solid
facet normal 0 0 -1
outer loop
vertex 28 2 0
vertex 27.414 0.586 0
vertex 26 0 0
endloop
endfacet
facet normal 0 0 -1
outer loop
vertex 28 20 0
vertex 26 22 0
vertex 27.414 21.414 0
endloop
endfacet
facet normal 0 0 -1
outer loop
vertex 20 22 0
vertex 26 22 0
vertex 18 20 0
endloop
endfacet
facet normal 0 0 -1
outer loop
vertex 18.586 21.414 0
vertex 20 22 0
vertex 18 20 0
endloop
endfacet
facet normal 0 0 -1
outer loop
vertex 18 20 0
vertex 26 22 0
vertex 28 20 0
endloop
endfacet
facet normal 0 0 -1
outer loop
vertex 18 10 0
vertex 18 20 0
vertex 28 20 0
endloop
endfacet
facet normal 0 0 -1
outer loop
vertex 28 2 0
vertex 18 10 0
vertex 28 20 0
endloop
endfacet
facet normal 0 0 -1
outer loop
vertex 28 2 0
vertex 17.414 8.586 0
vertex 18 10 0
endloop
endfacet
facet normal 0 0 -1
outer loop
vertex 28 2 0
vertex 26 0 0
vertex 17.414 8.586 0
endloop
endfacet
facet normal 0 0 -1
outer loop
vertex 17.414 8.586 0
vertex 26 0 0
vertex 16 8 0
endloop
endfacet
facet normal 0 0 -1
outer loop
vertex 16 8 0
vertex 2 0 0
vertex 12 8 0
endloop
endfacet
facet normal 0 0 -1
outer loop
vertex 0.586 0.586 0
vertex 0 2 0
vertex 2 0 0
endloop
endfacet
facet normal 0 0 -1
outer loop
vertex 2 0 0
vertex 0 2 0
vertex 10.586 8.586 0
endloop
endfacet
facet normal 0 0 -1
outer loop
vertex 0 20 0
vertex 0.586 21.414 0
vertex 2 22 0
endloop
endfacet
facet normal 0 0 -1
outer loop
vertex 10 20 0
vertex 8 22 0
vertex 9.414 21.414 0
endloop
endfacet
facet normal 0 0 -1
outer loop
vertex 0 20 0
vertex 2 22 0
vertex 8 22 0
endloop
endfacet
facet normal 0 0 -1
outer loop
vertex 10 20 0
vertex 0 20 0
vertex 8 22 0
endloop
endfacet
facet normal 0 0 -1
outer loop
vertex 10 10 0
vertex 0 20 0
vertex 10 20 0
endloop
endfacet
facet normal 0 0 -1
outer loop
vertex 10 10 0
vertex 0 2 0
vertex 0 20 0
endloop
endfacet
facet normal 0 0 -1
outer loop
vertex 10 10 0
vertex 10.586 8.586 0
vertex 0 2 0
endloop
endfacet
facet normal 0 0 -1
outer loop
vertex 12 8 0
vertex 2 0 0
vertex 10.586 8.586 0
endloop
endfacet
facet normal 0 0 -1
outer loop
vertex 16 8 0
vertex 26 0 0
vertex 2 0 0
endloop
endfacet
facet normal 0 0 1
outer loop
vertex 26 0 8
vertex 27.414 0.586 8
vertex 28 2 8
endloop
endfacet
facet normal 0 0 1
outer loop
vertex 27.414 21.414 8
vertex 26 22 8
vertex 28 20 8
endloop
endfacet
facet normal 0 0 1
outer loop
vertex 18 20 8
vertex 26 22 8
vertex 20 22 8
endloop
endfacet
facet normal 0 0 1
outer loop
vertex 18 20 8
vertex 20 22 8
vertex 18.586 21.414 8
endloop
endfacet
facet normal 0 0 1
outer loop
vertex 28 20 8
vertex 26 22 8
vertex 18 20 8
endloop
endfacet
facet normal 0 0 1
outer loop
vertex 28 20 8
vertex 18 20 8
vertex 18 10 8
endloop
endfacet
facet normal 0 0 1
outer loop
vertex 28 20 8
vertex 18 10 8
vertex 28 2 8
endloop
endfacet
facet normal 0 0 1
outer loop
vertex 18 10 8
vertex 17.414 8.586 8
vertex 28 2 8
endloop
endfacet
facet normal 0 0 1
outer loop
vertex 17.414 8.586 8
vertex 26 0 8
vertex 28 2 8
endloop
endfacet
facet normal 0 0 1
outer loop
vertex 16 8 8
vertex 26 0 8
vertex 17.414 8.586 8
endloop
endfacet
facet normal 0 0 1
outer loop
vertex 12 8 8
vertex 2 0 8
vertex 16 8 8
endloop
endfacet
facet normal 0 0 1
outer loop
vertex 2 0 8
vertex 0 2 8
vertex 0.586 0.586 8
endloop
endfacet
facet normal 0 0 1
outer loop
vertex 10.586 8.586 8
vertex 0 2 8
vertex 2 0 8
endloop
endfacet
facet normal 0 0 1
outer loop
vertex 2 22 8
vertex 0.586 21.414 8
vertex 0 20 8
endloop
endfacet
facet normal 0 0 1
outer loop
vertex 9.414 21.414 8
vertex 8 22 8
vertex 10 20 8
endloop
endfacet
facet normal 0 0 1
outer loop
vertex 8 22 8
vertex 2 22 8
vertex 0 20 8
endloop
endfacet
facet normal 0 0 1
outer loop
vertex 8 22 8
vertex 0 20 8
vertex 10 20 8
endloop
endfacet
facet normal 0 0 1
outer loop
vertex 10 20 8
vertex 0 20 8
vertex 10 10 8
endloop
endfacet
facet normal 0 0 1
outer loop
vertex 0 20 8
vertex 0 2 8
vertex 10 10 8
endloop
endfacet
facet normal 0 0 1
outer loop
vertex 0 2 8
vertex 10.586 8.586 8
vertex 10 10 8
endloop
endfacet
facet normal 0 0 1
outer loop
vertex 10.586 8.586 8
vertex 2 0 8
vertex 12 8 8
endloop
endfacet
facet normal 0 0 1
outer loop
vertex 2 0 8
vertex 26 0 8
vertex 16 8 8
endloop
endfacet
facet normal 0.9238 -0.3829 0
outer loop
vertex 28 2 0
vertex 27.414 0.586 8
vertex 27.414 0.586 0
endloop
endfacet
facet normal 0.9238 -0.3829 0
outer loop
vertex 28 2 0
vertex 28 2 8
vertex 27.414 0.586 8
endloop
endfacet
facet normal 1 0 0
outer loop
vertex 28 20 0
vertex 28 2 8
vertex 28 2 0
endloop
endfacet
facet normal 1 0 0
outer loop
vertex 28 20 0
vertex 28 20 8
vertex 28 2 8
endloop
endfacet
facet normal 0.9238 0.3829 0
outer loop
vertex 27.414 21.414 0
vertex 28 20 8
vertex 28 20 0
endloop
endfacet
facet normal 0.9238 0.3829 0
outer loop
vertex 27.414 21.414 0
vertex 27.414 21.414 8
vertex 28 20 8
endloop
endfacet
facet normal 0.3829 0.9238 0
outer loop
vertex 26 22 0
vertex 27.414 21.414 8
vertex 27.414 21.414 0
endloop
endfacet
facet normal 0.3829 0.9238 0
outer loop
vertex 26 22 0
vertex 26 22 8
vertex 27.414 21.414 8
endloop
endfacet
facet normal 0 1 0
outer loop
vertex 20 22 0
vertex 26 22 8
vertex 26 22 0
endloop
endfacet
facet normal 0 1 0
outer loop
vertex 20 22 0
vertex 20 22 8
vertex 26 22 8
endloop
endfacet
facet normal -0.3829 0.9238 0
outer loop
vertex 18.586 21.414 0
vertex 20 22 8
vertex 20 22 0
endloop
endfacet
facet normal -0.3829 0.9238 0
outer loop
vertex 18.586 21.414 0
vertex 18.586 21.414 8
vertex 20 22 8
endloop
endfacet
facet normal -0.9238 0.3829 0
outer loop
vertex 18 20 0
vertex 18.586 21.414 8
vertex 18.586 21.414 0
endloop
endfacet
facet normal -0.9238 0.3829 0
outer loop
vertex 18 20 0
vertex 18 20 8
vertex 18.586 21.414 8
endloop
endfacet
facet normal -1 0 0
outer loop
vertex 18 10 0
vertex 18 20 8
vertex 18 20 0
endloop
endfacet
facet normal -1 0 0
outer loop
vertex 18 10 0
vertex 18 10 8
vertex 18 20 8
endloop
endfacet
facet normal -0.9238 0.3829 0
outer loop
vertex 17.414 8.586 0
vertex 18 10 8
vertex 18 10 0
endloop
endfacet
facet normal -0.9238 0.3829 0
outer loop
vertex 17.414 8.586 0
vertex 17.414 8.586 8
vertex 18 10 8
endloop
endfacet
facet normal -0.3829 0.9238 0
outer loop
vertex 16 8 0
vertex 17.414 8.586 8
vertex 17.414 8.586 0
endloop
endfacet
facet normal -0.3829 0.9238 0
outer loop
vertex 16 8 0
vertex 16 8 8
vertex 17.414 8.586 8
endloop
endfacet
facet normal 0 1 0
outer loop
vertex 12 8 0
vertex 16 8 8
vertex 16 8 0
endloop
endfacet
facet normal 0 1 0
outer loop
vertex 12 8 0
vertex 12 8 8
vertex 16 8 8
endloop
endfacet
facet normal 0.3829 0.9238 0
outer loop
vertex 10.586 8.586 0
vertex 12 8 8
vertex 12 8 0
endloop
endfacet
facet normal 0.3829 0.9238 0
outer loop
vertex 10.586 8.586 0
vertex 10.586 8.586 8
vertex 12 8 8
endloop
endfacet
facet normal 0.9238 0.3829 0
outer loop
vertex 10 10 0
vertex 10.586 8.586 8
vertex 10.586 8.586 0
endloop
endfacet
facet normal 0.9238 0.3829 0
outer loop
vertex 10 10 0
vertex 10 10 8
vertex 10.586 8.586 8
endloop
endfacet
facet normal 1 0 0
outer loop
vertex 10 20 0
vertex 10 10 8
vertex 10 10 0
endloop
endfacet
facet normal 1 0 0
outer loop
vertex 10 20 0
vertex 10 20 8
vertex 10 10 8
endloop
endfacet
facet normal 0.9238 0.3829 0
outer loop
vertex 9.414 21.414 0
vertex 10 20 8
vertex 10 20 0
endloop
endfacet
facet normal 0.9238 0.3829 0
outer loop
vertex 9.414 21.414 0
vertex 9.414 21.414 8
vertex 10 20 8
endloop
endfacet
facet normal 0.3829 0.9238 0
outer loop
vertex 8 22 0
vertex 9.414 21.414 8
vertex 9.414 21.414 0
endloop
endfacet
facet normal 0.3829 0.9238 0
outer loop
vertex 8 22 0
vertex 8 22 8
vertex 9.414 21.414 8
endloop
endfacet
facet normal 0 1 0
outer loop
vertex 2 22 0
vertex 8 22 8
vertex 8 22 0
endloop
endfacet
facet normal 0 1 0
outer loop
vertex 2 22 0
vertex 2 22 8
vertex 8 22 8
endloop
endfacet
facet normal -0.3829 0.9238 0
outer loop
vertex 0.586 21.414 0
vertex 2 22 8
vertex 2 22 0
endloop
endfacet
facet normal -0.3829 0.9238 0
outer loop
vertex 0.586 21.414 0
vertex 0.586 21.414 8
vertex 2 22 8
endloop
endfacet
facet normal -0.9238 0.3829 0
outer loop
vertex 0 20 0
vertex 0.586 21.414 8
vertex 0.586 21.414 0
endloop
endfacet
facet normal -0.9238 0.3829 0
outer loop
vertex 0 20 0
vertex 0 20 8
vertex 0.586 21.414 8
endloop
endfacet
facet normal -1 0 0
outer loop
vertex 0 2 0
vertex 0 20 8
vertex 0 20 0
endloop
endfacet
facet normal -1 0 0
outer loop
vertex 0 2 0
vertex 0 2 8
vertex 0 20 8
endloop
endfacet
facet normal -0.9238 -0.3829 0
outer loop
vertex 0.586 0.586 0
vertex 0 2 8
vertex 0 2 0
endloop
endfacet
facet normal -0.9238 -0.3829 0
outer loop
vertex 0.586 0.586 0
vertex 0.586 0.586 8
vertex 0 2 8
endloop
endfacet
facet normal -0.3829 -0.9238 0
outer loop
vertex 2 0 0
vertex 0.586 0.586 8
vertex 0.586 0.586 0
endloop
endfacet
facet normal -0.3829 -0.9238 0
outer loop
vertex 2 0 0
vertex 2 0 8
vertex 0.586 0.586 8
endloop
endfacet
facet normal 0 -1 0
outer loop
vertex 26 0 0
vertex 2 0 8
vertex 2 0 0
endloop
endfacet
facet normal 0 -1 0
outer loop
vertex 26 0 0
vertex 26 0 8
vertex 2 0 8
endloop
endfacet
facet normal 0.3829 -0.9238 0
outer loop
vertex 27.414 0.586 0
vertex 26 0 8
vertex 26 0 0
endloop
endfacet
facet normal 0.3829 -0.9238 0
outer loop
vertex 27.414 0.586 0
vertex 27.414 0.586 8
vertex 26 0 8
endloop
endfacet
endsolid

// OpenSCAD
$fn = 32;

// ----------------------------------------------------------------------
// Eye lug: clevis, 8 mm thick
// ----------------------------------------------------------------------

// --- parameters (mm) ---
profile_height = 8;       // extrusion height
profile_points = 24;      // points of the closed outline

profile = [[0, 2], [0.586, 0.586], [2, 0], [26, 0], [27.414, 0.586], [28, 2], [28, 20], [27.414, 21.414], [26, 22], [20, 22], [18.586, 21.414], [18, 20], [18, 10], [17.414, 8.586], [16, 8], [12, 8], [10.586, 8.586], [10, 10], [10, 20], [9.414, 21.414], [8, 22], [2, 22], [0.586, 21.414], [0, 20]];  // single closed polygon, 24 points, counter clockwise

// --- the one profile operation ---
linear_extrude(height = profile_height) polygon(points = profile);
